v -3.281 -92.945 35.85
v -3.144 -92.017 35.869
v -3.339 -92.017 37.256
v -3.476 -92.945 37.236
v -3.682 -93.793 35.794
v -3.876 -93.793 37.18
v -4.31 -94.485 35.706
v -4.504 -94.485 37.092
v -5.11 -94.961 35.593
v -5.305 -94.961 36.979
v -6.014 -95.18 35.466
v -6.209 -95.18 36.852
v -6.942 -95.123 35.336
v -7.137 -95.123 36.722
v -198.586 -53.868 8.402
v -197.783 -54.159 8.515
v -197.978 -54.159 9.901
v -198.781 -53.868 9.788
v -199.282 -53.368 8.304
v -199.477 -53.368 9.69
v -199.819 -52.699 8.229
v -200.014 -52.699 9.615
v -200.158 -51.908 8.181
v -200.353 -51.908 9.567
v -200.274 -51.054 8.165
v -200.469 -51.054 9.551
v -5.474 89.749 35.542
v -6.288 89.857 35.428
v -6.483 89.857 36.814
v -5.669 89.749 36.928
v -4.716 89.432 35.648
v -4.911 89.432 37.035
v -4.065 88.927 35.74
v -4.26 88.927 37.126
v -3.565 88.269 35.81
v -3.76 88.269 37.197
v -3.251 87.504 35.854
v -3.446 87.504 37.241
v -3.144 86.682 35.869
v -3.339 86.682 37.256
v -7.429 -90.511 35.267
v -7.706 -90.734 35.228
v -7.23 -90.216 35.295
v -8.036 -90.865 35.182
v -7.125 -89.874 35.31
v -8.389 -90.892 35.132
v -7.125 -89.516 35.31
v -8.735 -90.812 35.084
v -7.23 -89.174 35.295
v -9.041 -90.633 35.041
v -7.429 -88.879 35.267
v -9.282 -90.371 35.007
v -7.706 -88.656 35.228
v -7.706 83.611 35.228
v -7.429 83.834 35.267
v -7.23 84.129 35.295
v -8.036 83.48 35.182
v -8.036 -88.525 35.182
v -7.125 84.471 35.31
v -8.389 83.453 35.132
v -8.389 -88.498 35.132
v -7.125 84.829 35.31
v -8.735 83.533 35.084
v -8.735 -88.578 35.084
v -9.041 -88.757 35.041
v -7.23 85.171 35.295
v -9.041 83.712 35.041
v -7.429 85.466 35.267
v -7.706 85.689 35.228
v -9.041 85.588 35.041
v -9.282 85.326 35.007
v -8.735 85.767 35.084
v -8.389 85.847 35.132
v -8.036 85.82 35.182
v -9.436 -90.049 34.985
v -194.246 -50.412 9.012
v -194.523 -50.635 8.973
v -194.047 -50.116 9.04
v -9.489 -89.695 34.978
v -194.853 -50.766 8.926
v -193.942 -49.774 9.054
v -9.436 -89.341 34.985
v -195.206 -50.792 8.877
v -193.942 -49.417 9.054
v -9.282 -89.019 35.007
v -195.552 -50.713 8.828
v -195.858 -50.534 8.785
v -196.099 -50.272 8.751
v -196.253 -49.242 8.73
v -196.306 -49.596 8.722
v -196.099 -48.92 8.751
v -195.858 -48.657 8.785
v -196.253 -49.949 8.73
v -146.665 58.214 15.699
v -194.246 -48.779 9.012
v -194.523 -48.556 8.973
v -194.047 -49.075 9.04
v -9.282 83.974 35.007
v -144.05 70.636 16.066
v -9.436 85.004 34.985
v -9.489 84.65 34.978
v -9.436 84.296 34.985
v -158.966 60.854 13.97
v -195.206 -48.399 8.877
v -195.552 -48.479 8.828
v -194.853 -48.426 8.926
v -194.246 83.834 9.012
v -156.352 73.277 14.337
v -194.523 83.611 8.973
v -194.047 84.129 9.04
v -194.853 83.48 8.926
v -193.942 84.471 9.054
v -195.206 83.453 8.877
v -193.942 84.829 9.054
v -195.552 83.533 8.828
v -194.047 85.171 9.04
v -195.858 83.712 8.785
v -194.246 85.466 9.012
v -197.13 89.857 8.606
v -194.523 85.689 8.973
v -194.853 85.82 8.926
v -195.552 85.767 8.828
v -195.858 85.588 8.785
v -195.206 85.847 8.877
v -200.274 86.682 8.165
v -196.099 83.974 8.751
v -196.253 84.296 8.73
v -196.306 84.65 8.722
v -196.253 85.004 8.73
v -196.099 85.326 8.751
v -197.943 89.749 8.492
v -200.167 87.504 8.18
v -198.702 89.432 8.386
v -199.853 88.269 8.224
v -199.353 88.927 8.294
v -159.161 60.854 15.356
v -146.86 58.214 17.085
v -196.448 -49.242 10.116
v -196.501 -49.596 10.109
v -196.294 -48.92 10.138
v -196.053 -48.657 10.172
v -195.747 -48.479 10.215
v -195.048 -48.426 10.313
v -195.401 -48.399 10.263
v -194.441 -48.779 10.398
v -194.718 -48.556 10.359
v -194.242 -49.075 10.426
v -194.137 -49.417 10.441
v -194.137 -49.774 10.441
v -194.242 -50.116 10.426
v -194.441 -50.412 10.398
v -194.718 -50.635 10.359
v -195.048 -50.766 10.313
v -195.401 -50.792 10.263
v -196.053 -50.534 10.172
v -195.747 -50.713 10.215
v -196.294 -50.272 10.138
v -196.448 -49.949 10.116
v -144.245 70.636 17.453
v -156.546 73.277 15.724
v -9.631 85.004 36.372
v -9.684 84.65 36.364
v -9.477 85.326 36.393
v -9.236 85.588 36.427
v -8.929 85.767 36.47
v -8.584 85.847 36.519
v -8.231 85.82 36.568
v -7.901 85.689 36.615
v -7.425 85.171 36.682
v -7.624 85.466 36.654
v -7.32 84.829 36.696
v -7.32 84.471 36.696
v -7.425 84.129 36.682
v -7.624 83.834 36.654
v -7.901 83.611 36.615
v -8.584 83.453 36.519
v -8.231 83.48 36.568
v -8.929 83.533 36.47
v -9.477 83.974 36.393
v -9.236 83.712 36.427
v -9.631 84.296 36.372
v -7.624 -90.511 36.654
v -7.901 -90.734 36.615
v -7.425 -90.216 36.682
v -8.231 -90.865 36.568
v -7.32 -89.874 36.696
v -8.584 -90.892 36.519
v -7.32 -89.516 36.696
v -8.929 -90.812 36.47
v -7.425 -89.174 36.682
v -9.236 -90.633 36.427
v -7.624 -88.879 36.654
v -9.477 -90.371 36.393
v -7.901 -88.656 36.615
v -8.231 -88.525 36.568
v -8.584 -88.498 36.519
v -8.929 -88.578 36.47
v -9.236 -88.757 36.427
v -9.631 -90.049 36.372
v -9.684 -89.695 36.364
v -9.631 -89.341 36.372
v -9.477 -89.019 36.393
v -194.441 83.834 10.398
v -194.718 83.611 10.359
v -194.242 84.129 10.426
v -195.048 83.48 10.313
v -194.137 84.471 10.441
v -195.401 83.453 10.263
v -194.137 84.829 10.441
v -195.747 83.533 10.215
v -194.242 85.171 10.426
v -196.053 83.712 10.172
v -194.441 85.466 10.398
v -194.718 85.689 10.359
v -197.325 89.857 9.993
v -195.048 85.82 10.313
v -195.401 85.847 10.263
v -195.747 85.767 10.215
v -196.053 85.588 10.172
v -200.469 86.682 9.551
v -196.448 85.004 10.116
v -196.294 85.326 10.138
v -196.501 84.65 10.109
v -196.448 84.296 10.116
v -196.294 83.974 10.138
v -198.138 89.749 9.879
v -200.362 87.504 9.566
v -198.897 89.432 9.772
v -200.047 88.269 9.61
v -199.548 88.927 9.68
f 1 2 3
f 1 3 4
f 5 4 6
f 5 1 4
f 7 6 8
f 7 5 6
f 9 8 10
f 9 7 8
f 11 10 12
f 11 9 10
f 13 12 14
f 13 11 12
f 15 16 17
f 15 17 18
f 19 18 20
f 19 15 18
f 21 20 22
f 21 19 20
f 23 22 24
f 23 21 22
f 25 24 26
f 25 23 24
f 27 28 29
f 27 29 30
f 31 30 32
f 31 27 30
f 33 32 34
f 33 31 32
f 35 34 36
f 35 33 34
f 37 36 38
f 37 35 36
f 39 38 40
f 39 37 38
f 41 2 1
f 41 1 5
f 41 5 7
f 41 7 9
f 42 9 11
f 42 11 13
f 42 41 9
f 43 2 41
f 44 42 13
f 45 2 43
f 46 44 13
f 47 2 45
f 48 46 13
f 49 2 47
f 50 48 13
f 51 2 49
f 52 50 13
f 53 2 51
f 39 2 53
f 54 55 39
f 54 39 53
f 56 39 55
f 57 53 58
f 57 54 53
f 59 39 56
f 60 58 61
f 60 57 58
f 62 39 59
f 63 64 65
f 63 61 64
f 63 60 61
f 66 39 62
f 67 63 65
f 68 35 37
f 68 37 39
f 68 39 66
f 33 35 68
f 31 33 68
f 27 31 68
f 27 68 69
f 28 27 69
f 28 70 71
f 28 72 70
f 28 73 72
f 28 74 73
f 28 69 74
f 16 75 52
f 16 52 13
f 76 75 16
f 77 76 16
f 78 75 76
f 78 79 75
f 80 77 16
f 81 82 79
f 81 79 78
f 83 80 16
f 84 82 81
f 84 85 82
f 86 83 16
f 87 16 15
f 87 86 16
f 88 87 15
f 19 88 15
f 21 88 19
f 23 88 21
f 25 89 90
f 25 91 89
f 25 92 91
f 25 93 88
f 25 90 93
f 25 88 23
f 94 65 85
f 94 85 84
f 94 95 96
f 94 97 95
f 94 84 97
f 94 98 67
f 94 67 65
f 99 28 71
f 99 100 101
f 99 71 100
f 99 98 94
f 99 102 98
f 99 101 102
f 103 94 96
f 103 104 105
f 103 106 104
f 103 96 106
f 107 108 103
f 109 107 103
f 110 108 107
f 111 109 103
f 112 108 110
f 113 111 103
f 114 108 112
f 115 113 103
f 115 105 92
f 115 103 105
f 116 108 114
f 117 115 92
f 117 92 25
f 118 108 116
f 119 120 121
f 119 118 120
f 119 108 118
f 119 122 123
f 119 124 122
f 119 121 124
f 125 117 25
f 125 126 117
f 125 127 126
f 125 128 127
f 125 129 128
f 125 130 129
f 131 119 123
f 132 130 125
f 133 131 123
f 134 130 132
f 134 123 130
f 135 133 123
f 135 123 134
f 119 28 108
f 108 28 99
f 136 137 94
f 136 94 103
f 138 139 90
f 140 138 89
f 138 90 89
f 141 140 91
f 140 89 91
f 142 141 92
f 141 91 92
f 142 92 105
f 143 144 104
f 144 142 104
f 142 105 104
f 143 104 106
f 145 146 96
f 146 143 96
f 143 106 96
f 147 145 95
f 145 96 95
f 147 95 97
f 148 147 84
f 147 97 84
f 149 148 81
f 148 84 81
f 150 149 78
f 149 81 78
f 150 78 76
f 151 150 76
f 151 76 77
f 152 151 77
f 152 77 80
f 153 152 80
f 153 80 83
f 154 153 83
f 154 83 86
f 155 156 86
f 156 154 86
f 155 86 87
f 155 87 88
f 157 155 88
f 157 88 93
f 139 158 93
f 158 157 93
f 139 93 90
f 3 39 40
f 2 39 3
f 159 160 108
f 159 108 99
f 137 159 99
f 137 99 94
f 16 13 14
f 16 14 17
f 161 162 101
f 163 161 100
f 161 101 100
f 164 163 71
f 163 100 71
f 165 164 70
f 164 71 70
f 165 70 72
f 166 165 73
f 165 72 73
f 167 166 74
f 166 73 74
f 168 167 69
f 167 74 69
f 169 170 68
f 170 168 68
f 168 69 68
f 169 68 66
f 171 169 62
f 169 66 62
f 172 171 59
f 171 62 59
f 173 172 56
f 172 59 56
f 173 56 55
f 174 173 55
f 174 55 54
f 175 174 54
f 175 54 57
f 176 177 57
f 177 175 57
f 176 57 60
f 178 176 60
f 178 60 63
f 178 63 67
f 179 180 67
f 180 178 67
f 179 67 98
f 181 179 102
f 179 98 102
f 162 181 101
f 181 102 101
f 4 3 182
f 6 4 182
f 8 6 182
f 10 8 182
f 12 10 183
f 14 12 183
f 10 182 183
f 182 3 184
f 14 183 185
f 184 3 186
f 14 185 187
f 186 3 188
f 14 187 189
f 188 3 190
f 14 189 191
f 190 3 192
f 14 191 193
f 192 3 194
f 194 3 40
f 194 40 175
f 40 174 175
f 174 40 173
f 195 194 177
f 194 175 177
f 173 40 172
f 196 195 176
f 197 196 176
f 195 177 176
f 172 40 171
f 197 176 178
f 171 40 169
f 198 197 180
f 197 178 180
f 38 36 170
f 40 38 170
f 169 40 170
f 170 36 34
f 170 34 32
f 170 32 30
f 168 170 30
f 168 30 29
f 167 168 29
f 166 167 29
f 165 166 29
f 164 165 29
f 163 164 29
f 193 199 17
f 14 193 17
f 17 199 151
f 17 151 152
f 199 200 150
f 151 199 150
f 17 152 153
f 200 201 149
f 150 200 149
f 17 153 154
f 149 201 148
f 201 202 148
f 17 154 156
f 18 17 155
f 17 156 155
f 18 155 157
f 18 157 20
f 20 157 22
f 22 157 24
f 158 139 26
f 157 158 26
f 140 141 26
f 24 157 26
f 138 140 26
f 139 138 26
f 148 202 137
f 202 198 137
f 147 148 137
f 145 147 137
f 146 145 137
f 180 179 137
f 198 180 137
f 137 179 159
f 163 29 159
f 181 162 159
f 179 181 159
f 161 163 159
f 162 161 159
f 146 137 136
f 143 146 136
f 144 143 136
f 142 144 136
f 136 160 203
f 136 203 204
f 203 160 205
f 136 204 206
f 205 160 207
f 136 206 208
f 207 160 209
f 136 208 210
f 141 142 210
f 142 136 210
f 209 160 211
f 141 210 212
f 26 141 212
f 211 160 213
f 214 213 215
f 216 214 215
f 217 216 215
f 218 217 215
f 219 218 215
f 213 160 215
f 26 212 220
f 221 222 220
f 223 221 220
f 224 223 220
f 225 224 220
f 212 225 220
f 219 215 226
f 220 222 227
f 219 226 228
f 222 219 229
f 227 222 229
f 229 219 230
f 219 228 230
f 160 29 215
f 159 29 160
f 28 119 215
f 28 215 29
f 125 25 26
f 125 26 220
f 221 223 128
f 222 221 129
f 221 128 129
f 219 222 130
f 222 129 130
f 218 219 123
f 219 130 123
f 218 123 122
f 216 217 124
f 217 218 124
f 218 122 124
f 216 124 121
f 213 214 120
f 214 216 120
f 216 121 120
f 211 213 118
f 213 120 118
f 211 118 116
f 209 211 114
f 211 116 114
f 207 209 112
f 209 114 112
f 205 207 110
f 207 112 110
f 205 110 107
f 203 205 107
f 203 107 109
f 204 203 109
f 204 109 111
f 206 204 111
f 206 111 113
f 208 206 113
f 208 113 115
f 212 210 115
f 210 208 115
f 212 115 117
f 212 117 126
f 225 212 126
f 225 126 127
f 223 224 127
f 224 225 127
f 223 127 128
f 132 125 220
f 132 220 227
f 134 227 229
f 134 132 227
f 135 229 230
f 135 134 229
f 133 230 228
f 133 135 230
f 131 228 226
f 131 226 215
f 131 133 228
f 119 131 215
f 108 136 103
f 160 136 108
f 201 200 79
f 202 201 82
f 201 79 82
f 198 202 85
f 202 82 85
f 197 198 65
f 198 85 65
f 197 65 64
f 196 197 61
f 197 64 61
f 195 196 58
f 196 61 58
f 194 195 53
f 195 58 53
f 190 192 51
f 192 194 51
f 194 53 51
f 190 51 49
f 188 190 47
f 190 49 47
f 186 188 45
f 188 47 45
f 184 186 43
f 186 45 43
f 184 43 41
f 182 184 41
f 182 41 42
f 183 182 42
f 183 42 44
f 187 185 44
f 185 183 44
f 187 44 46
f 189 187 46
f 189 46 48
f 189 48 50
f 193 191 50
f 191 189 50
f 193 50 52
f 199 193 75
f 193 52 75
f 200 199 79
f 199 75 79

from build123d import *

# Parameters (mm, degrees)
EXTRUDE018_DEPTH                          = 25.4
EXTRUDE018_ONTO_SKETCH024_PLACEMENT_ANGLE = 8
SKETCH018_AS_DRAWN_R                      = 1.2
EXTRUDE009_DEPTH                          = 7.8
EXTRUDE009_ONTO_SKETCH018_PLACEMENT_ANGLE = 8
EXTRUDE010_DEPTH                          = 1.4
EXTRUDE010_ONTO_SKETCH019_PLACEMENT_ANGLE = 8


with BuildPart() as reset_switch_hole:
    # Sketch024 as drawn → Extrude018 (new, symmetric)
    with BuildSketch(Plane.XY):
        Polygon((-152.83455, 73.27651), (-140.412076, 70.636031), (-143.052554, 58.213557), (-155.475029, 60.854035), align=None)
    extrude(amount=EXTRUDE018_DEPTH, both=True)


with BuildPart() as reset_switch_hole_1:
    # Extrude018 onto Sketch024 placement: moved
    add(reset_switch_hole.part.moved(Location((-7.384231, 0, 52.541536))).rotate(Axis((-7.384231, 0, 52.541536), (0, -1, 0)), EXTRUDE018_ONTO_SKETCH024_PLACEMENT_ANGLE))


with BuildPart() as screw_hole_cuts:
    # Sketch018 as drawn → Extrude009 (new)
    with BuildSketch(Plane.XY):
        with Locations((-31.998318, 84.649891)):
            Circle(SKETCH018_AS_DRAWN_R)
        with Locations((-31.998318, -89.695043)):
            Circle(SKETCH018_AS_DRAWN_R)
        with Locations((156.654735, -49.595599)):
            Circle(SKETCH018_AS_DRAWN_R)
        with Locations((156.654735, 84.649891)):
            Circle(SKETCH018_AS_DRAWN_R)
    extrude(amount=EXTRUDE009_DEPTH)


with BuildPart() as screw_hole_cuts_1:
    # Extrude009 onto Sketch018 placement: moved
    add(screw_hole_cuts.part.moved(Location((39.98734, 0, 30.691416))).rotate(Axis((39.98734, 0, 30.691416), (0, 1, 0)), EXTRUDE009_ONTO_SKETCH018_PLACEMENT_ANGLE))


with BuildPart() as right_plate_solid_w_screw_holes:
    # Sketch019 as drawn → Extrude010 (new)
    with BuildSketch(Plane.XY):
        with BuildLine():
            Line((-37.205318, 86.681891), (-37.205318, -92.017095))
            ThreePointArc((-37.205318, -92.017095), (-36.028411, -94.484534), (-33.370199, -95.122714))
            Line((-33.370199, -95.122714), (159.34685, -54.159441))
            ThreePointArc((159.34685, -54.159441), (161.154172, -53.051915), (161.861735, -51.053821))
            Line((161.861735, -51.053821), (161.861735, 86.681892))
            ThreePointArc((161.861735, 86.681892), (160.931799, 88.926956), (158.686734, 89.856891))
            Line((158.686734, 89.856891), (-34.030318, 89.856891))
            ThreePointArc((-34.030318, 89.856891), (-36.275382, 88.926955), (-37.205318, 86.681891))
        make_face()
    extrude(amount=EXTRUDE010_DEPTH)


with BuildPart() as right_plate_solid_w_screw_holes_1:
    # Extrude010 onto Sketch019 placement: moved
    add(right_plate_solid_w_screw_holes.part.moved(Location((39.98734, 0, 30.691416))).rotate(Axis((39.98734, 0, 30.691416), (0, 1, 0)), EXTRUDE010_ONTO_SKETCH019_PLACEMENT_ANGLE))

    # Cut002: cut Screw Hole Cuts
    add(screw_hole_cuts_1.part, mode=Mode.SUBTRACT)


with BuildPart() as cut011:
    # Part__Mirroring003: instance of Right Plate Solid w/ Screw Holes
    add(right_plate_solid_w_screw_holes_1.part.mirror(Plane(origin=(0, 0, 0), x_dir=(0, -1, 0), z_dir=(1, 0, 0))))

    # Cut011: cut Reset Switch Hole
    add(reset_switch_hole_1.part, mode=Mode.SUBTRACT)


solid = cut011.part
